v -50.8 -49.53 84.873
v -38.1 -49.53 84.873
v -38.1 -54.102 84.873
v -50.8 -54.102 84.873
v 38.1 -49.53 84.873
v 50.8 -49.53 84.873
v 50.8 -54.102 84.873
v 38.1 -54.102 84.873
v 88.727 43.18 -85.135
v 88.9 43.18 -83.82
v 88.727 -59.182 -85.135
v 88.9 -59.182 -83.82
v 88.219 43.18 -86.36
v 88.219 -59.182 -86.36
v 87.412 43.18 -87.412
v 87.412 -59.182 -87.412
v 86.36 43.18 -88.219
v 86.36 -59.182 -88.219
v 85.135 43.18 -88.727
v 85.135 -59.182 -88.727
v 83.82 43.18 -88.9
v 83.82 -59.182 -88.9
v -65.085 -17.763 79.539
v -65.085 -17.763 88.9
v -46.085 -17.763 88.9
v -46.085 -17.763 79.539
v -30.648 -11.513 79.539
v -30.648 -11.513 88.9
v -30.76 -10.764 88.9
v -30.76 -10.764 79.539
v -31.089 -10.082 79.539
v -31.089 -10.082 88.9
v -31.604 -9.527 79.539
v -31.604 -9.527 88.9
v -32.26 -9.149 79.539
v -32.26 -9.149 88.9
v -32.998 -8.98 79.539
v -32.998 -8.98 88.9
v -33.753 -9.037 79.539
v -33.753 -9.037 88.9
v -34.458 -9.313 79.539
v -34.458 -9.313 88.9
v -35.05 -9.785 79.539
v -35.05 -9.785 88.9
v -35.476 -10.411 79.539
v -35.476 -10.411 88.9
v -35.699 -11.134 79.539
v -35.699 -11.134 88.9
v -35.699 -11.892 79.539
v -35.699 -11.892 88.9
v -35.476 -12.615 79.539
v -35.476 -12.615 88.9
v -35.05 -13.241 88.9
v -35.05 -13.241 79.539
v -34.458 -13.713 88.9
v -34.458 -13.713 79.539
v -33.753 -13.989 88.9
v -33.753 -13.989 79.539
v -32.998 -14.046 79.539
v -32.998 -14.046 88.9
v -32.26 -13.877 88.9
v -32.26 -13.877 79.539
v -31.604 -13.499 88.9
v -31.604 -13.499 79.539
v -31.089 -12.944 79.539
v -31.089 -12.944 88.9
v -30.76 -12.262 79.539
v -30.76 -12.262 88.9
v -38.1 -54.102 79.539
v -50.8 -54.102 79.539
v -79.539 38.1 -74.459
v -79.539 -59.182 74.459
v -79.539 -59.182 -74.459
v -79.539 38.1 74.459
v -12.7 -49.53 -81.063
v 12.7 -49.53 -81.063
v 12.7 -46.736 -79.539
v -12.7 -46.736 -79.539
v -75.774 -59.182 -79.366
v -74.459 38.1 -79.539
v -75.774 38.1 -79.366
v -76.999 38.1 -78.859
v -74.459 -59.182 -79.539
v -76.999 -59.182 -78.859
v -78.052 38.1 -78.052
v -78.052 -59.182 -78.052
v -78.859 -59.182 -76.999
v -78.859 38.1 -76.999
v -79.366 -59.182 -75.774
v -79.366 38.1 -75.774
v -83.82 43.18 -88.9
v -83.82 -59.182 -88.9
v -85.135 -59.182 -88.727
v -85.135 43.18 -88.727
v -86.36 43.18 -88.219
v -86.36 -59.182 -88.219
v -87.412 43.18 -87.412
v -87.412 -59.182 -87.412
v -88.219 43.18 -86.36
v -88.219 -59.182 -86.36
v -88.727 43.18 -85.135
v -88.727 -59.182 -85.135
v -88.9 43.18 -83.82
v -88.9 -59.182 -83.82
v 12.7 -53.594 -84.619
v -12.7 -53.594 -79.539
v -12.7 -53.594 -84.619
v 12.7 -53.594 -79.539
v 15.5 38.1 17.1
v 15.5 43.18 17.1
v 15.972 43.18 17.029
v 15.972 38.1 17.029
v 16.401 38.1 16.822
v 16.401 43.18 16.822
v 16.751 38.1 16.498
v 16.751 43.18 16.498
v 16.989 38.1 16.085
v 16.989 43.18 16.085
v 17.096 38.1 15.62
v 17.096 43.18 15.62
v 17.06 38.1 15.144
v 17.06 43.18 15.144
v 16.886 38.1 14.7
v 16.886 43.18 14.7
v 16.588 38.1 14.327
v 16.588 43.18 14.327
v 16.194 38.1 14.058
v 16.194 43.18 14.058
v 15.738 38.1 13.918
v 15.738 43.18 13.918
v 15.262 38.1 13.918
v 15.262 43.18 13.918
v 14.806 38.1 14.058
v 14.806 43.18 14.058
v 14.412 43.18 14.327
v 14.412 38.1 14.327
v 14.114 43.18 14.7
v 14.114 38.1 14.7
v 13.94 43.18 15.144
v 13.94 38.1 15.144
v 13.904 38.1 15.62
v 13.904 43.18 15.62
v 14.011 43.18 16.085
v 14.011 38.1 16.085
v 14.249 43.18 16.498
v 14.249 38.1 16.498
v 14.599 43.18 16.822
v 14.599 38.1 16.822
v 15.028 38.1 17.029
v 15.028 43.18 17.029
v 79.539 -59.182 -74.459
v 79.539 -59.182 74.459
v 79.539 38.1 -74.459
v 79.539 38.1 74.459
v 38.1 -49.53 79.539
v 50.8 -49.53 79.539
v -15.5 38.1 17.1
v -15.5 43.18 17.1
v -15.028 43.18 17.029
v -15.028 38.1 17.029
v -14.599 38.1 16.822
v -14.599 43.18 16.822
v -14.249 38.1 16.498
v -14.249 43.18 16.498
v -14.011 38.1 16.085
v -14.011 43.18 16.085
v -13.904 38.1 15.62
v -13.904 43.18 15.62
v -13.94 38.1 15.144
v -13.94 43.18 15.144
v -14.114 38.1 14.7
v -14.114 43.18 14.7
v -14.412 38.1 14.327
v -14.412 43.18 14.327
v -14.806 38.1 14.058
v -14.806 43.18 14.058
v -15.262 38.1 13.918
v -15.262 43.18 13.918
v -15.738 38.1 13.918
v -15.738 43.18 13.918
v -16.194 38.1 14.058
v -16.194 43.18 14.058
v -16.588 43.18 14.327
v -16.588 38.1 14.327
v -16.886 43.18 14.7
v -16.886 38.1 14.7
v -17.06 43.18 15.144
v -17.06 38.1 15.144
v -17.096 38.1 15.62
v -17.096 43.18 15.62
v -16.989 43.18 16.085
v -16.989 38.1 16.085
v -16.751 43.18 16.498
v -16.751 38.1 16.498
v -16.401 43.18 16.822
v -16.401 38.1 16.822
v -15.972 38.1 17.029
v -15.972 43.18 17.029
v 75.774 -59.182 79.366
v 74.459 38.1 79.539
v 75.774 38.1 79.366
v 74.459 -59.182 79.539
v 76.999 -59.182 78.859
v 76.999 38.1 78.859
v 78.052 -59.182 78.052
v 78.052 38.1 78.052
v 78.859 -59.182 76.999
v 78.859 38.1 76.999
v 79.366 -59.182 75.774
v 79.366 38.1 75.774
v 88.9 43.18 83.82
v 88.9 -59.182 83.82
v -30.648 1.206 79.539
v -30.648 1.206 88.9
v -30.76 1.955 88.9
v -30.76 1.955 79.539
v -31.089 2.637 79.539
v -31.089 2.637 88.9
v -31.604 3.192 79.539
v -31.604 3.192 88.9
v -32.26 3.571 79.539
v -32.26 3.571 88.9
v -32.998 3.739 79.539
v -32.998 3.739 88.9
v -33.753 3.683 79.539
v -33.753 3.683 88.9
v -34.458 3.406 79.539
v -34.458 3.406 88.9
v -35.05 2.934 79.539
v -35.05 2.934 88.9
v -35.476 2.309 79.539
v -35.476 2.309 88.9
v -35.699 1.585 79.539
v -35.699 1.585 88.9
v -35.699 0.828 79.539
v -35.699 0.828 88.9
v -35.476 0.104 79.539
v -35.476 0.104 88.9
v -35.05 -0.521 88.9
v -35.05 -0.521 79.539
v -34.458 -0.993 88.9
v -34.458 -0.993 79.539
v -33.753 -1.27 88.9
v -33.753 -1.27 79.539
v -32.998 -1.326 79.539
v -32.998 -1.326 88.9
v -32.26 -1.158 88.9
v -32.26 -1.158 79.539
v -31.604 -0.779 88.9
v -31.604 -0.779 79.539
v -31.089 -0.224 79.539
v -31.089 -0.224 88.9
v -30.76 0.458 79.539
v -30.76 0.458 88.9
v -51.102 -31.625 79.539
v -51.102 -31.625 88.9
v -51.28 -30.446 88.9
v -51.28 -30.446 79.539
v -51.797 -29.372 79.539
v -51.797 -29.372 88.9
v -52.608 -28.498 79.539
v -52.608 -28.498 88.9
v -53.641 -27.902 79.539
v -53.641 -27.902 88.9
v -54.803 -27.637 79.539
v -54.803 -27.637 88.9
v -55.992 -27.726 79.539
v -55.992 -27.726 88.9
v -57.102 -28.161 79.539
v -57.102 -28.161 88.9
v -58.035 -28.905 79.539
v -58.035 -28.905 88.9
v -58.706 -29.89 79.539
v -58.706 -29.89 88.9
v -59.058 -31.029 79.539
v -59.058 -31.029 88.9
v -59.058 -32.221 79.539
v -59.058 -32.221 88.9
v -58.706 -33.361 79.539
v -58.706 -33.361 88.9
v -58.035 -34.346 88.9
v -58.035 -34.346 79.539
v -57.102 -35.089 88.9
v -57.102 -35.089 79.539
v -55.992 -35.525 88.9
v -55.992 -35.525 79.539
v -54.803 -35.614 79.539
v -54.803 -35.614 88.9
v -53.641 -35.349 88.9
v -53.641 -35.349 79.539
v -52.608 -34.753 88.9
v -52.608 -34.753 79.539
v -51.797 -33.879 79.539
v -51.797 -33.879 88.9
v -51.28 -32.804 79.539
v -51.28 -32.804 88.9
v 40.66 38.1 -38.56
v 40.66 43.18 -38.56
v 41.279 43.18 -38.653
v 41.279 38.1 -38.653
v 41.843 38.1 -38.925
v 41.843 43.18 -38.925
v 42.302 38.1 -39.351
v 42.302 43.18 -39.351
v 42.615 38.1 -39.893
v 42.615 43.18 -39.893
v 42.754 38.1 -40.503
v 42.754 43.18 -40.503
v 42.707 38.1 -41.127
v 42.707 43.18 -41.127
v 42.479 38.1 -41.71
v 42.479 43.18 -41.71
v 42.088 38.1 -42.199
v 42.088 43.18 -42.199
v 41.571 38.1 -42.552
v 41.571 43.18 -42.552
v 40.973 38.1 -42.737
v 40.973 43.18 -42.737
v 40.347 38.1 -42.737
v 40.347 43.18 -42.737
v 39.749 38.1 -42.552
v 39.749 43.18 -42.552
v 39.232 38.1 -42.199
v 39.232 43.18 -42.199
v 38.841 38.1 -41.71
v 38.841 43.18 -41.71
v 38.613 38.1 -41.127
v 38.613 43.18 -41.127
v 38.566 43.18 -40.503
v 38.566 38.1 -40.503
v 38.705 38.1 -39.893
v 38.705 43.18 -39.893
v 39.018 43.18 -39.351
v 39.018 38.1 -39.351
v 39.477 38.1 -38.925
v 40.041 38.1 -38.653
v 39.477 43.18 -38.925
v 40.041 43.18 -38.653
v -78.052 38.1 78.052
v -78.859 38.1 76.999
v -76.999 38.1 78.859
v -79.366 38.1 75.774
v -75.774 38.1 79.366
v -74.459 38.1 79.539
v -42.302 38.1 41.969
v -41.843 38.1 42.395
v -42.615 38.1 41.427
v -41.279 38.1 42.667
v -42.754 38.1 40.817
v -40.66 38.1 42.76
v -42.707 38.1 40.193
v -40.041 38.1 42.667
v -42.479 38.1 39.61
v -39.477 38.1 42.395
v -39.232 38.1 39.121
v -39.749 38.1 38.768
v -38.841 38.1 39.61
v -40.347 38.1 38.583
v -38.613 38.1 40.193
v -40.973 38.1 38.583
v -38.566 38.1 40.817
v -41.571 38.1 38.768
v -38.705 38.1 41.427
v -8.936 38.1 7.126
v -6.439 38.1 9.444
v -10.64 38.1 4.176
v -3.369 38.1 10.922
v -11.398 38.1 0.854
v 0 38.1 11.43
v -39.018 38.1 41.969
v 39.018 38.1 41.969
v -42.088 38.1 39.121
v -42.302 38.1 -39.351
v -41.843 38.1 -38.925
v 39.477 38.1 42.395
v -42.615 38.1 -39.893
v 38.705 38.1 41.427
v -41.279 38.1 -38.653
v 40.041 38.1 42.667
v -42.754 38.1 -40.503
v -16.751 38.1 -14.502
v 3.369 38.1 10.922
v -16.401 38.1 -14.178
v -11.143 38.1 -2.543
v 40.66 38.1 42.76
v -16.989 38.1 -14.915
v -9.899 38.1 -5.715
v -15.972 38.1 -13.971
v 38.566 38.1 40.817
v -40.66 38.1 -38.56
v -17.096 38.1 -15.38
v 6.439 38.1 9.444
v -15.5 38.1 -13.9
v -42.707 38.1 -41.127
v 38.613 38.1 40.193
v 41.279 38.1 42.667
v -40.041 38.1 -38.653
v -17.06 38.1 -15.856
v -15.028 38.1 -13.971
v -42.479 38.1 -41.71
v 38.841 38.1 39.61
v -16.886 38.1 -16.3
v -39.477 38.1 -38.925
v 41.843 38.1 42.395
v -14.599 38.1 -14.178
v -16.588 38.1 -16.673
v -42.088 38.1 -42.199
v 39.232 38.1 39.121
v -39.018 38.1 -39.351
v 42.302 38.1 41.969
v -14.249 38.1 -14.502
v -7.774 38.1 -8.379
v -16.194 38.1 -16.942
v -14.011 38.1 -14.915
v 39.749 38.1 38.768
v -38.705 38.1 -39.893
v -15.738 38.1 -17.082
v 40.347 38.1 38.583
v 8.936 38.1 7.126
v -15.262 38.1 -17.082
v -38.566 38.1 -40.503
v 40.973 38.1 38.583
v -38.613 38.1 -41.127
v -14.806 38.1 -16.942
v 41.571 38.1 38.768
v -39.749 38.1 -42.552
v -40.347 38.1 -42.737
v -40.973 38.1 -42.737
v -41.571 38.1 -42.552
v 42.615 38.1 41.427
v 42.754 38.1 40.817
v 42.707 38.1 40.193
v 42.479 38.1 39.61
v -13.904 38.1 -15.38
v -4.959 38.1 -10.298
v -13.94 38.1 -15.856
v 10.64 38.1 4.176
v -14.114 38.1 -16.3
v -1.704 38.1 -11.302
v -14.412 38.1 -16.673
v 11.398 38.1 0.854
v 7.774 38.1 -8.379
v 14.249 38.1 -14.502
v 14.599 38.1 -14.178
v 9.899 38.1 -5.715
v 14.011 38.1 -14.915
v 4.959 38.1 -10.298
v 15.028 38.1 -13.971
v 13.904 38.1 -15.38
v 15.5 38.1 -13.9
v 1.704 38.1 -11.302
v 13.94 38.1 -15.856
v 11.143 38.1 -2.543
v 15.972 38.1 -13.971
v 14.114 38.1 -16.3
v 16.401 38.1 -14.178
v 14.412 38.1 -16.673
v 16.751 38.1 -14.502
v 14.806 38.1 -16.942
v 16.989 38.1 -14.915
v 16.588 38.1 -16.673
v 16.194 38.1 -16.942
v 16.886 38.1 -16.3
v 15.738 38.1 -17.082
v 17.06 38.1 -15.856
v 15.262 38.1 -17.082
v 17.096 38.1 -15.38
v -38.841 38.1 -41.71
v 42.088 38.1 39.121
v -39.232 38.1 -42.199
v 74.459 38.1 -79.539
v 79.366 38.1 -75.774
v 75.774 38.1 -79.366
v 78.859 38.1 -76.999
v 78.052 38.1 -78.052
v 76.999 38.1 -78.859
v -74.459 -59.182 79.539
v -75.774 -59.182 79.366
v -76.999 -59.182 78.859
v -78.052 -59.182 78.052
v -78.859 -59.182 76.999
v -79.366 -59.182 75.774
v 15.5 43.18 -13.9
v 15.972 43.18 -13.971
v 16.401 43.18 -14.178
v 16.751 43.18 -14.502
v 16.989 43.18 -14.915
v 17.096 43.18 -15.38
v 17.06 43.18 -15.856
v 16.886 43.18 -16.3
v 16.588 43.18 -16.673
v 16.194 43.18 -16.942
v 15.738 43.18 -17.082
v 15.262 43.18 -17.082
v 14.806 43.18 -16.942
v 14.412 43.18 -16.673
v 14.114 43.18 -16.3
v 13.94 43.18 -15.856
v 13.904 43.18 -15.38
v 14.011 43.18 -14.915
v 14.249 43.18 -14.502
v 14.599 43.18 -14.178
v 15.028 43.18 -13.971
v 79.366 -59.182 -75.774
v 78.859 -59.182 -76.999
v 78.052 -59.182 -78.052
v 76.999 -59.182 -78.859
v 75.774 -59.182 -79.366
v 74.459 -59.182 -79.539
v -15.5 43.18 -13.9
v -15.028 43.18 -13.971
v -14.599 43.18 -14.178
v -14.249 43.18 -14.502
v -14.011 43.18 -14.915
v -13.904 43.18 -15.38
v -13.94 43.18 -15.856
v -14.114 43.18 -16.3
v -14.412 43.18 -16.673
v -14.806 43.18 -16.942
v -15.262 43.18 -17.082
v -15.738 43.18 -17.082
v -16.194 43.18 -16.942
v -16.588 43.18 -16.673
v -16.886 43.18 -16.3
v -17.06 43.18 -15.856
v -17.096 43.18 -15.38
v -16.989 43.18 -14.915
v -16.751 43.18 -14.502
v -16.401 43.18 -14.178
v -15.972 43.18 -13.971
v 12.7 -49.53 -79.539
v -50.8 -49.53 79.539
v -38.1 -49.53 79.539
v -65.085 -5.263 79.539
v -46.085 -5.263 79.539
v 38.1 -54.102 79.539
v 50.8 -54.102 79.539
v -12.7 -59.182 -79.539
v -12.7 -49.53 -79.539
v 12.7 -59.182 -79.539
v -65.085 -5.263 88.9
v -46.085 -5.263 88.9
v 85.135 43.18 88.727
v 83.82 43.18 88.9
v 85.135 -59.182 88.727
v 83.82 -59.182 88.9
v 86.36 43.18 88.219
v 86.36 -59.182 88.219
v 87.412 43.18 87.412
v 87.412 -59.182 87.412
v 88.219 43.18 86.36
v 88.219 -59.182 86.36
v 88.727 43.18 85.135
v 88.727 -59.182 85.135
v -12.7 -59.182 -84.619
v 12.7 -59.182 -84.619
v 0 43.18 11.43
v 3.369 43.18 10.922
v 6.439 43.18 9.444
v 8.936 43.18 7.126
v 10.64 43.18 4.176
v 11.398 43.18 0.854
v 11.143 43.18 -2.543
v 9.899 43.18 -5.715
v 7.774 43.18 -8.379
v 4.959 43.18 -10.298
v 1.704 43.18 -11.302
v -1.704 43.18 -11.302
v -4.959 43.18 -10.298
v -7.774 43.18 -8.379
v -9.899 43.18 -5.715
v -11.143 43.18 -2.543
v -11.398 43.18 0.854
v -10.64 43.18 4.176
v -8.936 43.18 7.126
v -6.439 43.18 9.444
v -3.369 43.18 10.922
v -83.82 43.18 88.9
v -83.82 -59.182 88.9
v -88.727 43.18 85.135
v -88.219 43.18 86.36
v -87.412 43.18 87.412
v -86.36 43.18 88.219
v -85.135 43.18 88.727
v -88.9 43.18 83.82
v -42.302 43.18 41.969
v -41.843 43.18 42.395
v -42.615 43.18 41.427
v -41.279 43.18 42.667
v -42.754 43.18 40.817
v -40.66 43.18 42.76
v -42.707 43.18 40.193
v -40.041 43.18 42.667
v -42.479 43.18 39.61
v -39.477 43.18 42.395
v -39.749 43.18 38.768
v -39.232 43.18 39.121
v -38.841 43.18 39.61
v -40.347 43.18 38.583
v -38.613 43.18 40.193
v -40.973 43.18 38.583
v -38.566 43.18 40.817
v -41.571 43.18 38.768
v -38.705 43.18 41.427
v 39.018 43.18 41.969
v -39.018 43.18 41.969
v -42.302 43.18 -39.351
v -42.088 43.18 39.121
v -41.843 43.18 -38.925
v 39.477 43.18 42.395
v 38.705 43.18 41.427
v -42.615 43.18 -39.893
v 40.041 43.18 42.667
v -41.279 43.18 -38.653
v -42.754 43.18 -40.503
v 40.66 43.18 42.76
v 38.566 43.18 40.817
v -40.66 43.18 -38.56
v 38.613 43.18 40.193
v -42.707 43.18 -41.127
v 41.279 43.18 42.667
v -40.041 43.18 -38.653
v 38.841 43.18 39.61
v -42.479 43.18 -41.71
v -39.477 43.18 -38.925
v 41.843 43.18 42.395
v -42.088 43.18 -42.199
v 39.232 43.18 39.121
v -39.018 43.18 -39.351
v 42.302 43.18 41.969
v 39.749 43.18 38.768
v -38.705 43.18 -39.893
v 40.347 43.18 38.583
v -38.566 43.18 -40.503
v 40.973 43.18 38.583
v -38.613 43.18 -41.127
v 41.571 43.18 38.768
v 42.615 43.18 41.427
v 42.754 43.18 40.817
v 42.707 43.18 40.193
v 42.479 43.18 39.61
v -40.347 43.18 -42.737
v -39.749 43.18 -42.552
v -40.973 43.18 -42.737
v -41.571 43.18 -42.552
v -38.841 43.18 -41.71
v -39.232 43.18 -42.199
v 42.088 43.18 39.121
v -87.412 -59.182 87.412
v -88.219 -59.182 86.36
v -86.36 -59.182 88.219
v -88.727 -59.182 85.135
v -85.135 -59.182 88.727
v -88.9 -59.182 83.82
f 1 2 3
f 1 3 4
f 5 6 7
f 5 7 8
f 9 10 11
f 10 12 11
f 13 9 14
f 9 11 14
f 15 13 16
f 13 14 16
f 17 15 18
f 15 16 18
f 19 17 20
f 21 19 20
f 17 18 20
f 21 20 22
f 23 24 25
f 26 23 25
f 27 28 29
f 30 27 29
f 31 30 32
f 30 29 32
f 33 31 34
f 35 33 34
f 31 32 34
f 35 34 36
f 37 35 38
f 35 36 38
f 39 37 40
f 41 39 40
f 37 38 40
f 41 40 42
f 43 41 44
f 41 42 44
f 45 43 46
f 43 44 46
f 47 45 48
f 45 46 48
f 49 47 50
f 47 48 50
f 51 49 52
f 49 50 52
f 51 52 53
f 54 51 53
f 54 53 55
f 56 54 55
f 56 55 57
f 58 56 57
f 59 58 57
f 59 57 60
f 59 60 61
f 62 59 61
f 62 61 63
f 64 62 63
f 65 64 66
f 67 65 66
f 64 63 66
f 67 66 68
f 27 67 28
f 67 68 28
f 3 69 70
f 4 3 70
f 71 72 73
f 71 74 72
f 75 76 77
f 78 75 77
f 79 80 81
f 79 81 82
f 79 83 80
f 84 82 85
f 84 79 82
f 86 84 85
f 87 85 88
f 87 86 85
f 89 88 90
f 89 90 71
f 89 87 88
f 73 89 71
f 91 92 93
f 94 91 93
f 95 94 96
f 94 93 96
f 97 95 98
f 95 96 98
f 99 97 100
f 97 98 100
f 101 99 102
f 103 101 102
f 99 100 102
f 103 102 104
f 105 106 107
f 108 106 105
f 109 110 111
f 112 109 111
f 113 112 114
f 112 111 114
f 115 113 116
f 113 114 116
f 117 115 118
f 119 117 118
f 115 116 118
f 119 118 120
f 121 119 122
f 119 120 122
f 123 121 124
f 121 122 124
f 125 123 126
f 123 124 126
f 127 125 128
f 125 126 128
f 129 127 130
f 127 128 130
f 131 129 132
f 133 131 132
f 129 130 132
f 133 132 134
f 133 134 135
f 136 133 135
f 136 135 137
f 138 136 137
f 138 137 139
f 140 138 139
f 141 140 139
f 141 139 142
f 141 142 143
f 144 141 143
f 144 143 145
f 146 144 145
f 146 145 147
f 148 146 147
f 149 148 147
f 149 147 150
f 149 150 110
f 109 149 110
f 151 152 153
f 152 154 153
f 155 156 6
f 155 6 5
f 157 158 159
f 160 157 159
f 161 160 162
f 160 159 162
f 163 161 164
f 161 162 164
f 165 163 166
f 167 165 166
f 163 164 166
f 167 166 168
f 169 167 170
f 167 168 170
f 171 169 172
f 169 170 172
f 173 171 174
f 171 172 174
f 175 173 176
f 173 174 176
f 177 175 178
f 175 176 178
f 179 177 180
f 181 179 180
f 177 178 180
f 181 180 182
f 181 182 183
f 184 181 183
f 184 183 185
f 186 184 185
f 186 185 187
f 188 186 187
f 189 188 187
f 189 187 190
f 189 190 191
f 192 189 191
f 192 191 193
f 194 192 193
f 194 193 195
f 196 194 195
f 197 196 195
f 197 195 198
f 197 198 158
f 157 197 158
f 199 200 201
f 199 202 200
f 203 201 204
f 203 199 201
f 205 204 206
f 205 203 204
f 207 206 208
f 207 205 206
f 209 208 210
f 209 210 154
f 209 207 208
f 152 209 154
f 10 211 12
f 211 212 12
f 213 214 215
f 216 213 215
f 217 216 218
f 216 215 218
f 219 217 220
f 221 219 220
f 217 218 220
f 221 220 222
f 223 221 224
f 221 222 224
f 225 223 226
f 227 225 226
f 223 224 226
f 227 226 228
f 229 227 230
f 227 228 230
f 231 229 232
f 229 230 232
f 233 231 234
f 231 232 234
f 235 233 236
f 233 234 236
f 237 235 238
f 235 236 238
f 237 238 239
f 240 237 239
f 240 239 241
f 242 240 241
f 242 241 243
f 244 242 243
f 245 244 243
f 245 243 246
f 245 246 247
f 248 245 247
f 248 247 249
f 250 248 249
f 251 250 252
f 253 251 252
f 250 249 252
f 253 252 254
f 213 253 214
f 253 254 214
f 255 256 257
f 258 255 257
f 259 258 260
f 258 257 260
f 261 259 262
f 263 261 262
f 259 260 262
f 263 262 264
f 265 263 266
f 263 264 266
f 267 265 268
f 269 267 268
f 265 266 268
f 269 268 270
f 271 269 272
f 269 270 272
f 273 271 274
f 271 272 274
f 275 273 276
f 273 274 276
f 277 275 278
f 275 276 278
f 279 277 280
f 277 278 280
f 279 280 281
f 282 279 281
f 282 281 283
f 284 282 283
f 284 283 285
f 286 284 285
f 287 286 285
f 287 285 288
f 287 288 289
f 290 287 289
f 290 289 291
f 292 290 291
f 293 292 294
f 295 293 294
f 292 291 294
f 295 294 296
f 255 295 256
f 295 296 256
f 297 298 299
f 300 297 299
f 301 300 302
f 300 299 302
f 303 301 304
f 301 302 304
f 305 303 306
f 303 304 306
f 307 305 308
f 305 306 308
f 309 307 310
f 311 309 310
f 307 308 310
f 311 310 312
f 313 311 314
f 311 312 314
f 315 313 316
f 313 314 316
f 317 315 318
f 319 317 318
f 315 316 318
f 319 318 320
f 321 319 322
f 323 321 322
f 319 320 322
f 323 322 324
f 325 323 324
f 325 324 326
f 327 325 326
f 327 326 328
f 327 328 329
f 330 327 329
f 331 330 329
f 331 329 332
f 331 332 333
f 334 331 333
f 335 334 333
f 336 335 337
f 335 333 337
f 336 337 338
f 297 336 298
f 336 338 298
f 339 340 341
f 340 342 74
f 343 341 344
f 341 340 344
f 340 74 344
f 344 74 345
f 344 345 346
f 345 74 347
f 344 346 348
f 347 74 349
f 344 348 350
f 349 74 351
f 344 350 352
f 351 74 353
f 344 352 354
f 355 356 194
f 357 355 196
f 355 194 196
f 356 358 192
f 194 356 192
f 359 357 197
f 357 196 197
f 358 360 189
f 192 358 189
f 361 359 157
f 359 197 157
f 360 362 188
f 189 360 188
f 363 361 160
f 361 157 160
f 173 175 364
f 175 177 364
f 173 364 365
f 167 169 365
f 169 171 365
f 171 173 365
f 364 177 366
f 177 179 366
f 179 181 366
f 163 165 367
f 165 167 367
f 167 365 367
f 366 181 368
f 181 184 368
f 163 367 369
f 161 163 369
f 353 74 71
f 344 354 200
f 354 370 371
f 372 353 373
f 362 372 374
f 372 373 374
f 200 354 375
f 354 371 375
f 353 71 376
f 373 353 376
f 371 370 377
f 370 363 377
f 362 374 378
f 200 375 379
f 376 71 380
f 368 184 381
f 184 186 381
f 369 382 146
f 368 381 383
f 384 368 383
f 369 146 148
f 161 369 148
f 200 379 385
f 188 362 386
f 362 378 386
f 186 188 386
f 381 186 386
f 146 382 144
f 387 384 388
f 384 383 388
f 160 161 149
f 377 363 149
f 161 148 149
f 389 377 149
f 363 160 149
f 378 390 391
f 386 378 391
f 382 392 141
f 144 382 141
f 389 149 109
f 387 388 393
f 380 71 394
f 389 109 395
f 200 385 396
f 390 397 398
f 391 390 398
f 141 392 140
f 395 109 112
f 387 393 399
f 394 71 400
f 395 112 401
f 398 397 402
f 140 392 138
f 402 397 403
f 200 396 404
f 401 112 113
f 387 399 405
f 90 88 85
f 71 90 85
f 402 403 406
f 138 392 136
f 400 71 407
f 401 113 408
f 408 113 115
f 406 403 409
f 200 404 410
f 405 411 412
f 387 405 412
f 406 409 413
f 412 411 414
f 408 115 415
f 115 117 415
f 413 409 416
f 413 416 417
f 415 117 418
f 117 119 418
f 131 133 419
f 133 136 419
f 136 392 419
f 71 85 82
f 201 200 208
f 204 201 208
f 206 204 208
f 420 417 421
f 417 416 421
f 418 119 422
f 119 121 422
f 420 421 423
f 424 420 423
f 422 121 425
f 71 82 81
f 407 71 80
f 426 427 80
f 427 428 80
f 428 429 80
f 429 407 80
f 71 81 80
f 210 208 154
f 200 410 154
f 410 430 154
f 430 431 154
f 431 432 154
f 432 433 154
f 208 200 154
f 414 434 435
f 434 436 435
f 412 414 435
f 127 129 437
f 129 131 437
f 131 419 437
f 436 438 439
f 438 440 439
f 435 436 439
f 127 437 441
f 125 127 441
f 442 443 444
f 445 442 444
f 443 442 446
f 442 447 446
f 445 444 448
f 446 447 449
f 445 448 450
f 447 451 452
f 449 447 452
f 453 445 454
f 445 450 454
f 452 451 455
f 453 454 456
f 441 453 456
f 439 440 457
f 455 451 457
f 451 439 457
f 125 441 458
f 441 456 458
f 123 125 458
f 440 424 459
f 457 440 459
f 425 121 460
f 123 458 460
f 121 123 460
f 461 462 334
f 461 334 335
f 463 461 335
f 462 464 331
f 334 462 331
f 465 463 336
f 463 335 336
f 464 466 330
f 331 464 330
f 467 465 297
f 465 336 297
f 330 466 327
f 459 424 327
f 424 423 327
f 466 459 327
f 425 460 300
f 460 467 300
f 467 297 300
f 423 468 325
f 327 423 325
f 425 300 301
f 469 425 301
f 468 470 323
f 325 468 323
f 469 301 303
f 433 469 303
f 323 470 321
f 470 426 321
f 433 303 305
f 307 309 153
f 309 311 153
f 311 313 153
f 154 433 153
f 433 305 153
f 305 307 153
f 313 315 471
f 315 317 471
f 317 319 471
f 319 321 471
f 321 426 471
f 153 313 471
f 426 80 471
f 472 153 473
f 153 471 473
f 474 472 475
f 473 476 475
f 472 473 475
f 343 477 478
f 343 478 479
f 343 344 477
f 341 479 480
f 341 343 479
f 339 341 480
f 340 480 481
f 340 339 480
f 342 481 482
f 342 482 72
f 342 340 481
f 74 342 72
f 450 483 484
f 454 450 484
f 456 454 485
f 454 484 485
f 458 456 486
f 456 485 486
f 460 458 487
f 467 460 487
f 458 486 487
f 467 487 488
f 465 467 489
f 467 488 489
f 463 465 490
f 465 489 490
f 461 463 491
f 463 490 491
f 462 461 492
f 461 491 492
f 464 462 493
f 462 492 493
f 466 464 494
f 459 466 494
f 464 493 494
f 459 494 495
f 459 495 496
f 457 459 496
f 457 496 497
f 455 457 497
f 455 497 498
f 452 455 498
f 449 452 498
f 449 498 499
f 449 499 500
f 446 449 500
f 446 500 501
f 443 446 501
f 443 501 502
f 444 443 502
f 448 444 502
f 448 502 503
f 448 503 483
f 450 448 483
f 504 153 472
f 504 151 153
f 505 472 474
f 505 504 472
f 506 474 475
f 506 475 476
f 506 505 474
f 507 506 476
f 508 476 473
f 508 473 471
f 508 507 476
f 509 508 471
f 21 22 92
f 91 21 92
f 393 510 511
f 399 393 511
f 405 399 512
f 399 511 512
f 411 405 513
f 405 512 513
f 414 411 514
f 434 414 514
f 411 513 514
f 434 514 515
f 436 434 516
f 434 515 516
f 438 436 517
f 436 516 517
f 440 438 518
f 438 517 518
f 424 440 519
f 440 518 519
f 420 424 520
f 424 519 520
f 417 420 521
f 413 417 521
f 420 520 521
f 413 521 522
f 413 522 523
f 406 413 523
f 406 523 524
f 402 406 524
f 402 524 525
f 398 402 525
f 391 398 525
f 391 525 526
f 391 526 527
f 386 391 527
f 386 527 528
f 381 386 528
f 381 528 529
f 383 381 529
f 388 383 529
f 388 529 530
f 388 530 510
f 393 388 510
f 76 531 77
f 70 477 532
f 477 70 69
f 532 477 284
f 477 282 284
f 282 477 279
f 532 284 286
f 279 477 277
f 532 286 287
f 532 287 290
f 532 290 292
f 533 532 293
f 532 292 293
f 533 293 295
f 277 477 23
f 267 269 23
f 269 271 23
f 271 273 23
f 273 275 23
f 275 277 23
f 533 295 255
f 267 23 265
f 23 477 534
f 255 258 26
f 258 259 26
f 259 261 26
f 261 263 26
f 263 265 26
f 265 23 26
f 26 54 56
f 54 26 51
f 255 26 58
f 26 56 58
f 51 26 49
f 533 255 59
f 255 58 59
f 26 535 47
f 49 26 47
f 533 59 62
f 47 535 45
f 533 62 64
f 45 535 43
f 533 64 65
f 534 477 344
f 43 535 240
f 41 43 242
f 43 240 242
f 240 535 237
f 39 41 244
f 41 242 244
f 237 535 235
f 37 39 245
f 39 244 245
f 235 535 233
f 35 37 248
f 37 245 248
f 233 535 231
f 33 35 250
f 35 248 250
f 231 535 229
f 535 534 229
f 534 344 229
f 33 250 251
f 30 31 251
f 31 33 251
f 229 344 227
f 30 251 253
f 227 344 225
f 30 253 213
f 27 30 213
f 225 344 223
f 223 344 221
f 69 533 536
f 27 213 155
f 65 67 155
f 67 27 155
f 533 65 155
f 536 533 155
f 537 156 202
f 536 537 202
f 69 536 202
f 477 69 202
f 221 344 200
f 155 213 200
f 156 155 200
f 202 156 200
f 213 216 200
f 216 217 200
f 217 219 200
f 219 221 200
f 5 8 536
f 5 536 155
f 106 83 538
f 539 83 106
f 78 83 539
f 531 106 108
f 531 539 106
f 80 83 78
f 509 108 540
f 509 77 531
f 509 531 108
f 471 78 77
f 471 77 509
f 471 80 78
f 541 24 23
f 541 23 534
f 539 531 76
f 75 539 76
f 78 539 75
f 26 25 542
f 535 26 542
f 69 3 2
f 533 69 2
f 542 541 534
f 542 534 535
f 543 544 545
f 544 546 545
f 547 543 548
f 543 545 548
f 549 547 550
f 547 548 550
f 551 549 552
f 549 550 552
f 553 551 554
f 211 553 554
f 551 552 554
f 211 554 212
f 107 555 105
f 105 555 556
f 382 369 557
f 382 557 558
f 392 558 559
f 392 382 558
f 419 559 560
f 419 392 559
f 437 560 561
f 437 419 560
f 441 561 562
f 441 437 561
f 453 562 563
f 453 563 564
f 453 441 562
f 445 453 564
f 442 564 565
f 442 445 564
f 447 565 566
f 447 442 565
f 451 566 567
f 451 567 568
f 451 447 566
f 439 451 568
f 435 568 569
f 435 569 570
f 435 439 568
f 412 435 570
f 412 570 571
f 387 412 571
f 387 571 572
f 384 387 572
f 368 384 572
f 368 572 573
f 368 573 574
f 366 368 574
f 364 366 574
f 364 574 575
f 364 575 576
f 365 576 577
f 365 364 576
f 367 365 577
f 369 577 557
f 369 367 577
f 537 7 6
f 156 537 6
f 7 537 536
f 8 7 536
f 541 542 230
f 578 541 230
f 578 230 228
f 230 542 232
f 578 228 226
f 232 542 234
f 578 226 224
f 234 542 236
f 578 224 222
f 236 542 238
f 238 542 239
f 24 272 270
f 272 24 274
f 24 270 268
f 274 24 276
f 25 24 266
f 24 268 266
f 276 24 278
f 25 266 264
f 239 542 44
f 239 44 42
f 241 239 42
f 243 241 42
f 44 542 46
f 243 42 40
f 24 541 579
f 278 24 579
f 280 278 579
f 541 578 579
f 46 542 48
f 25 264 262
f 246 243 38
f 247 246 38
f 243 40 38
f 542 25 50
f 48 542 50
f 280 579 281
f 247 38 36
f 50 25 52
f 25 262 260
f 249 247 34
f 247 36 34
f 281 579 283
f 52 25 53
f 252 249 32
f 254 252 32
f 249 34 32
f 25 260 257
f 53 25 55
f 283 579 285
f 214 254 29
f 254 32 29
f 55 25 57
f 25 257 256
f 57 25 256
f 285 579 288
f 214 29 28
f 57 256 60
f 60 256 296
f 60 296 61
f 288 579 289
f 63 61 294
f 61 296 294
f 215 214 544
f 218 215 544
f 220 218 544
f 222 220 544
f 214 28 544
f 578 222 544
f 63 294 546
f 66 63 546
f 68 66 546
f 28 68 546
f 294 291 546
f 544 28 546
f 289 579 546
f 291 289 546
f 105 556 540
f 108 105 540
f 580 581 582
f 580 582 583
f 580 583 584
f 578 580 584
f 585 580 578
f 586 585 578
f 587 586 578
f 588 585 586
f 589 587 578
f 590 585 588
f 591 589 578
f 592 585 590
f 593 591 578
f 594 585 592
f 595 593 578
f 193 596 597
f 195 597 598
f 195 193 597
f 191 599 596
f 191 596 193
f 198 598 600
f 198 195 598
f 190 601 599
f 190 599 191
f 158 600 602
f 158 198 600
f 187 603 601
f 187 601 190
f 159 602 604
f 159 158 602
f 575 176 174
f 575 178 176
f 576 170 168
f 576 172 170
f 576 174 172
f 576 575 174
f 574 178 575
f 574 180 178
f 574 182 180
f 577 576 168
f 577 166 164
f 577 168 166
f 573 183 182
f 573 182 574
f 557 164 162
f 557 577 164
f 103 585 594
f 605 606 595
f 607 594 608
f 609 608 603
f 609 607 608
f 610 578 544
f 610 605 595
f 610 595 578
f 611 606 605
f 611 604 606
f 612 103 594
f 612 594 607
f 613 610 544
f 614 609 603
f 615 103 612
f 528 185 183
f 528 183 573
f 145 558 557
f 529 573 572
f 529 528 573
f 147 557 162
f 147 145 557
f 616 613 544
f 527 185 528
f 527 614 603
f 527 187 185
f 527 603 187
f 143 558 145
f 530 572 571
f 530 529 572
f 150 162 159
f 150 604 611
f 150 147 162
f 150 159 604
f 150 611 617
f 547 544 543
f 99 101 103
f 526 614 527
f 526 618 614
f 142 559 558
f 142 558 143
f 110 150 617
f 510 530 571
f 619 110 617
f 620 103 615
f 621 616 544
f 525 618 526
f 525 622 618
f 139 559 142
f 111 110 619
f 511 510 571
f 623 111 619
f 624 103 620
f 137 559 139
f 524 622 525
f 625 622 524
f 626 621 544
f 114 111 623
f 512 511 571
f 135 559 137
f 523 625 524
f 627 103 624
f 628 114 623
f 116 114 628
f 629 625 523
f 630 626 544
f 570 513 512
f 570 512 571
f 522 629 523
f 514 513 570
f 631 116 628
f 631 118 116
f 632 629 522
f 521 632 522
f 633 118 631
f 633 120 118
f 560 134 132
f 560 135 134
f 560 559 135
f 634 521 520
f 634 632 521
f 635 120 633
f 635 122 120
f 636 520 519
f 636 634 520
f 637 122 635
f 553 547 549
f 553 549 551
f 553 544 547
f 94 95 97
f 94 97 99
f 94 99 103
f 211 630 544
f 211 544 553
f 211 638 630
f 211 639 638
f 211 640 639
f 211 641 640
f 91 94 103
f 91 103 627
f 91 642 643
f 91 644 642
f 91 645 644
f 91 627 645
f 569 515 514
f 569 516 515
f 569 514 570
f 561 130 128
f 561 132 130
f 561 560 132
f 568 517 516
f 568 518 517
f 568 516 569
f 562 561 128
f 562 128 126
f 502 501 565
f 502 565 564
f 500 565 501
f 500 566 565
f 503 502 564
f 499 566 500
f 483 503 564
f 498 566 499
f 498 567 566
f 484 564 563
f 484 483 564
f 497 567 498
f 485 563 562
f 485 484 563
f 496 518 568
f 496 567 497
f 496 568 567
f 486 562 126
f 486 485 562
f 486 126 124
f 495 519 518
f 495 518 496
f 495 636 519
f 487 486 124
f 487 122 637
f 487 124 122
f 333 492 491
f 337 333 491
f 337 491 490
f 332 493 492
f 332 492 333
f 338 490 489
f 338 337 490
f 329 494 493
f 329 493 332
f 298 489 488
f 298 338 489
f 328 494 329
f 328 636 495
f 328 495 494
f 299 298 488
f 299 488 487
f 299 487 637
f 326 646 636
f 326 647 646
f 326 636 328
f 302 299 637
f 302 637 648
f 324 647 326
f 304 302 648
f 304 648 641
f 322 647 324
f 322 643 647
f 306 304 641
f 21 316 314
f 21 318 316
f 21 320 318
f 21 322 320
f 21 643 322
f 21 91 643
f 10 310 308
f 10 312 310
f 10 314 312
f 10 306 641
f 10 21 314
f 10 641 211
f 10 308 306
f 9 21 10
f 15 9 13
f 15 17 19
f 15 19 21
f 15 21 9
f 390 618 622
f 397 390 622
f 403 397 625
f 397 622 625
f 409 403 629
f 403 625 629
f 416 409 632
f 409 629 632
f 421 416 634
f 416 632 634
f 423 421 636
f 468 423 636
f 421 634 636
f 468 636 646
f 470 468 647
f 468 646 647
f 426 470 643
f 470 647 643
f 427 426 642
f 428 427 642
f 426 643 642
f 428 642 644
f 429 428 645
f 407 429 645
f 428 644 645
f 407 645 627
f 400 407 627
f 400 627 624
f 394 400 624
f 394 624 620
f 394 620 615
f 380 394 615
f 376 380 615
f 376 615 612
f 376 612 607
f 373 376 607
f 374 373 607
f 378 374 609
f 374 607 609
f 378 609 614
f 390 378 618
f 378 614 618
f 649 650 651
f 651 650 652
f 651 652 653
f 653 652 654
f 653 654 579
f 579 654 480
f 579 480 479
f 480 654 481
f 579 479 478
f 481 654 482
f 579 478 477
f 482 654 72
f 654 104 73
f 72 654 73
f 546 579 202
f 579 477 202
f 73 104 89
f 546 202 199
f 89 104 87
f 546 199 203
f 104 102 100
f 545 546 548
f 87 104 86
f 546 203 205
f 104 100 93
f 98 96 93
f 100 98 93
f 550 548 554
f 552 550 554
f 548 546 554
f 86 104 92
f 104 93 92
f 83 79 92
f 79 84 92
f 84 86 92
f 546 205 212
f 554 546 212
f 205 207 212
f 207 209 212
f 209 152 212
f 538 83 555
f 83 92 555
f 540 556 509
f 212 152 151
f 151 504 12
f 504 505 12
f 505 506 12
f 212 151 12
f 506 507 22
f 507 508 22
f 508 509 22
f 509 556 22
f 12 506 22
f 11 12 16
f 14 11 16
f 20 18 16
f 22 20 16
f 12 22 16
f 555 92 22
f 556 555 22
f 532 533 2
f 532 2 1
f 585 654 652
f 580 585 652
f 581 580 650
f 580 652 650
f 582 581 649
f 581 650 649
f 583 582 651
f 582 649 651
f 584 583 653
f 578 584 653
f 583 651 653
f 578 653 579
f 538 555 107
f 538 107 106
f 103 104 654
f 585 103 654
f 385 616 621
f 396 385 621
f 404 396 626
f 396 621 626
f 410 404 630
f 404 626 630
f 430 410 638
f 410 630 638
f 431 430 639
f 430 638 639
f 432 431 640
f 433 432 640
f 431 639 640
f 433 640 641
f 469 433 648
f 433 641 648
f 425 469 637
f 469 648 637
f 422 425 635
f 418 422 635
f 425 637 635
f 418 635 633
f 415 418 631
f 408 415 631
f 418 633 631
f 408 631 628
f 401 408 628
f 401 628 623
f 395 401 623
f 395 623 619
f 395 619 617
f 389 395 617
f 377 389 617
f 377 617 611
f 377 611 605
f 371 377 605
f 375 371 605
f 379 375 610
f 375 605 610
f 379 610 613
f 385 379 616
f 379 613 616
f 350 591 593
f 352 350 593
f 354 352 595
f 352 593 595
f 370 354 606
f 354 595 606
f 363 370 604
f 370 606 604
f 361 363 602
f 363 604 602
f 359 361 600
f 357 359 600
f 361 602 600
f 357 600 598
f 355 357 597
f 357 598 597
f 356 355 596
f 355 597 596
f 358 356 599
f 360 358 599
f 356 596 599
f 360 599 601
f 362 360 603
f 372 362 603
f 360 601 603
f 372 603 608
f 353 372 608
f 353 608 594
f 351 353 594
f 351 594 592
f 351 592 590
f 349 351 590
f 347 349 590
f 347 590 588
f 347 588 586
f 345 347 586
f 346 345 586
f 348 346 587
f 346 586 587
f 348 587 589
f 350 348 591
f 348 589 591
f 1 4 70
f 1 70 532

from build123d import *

# Parameters (mm, degrees)
SKETCH1_W                = 159.078855478
SKETCH1_H                = 159.078855478
BOSS_EXTRUDE1_DEPTH      = 38.1
BOSS_EXTRUDE1_DEPTH_BACK = 59.182
BOSS_EXTRUDE3_START      = 38.1
SKETCH1_5_R              = 11.43
BOSS_EXTRUDE3_DEPTH      = 5.08
SKETCH3_R                = 1.6
CUT_EXTRUDE1_DEPTH       = 163.124640459
FILLET4_R                = 5.08
SKETCH4_R                = 2.1
CUT_EXTRUDE2_DEPTH       = 5.08
SKETCH5_R                = 2.54
SKETCH5_R_2              = 4
SKETCH5_W                = 19
SKETCH5_H                = 12.5
CUT_EXTRUDE3_DEPTH       = 9.360572261
SKETCH7_W                = 25.4
SKETCH7_H                = 5.08
CUT_EXTRUDE4_DEPTH       = 5.588
BOSS_EXTRUDE4_DEPTH      = 25.4
CUT_EXTRUDE5_DEPTH       = 25.4
SKETCH11_W               = 12.7
SKETCH11_H               = 4.572
CUT_EXTRUDE6_DEPTH       = 5.334


with BuildPart() as part:
    # Sketch1 → Boss-Extrude1 (new, two sides)
    with BuildSketch(Plane(origin=(0, 0, 0), x_dir=(1, 0, 0), z_dir=(0, 1, 0))) as boss_extrude1_sk:
        with BuildLine():
            Line((-83.82, -88.9), (83.82, -88.9))
            ThreePointArc((83.82, -88.9), (87.412102448, -87.412102448), (88.9, -83.82))
            Line((88.9, -83.82), (88.9, 83.82))
            ThreePointArc((88.9, 83.82), (87.412102448, 87.412102448), (83.82, 88.9))
            Line((83.82, 88.9), (-83.82, 88.9))
            ThreePointArc((-83.82, 88.9), (-87.412102448, 87.412102448), (-88.9, 83.82))
            Line((-88.9, 83.82), (-88.9, -83.82))
            ThreePointArc((-88.9, -83.82), (-87.412102448, -87.412102448), (-83.82, -88.9))
        make_face()
        Rectangle(SKETCH1_W, SKETCH1_H, mode=Mode.SUBTRACT)
    extrude(amount=BOSS_EXTRUDE1_DEPTH)
    extrude(boss_extrude1_sk.sketch, amount=-BOSS_EXTRUDE1_DEPTH_BACK)

    # Sketch1<5> → Boss-Extrude3 (add)
    with BuildSketch(Plane(origin=(0, 0, 0), x_dir=(1, 0, 0), z_dir=(0, 1, 0)).offset(BOSS_EXTRUDE3_START)):
        with BuildLine():
            ThreePointArc((-88.9, -83.82), (-87.412102448, -87.412102448), (-83.82, -88.9))
            Line((-83.82, -88.9), (83.82, -88.9))
            ThreePointArc((83.82, -88.9), (87.412102448, -87.412102448), (88.9, -83.82))
            Line((88.9, -83.82), (88.9, 83.82))
            ThreePointArc((88.9, 83.82), (87.412102448, 87.412102448), (83.82, 88.9))
            Line((83.82, 88.9), (-83.82, 88.9))
            ThreePointArc((-83.82, 88.9), (-87.412102448, 87.412102448), (-88.9, 83.82))
            Line((-88.9, 83.82), (-88.9, -83.82))
        make_face()
        with Locations(Location((0, 0, 0), (0, 0, 270))):
            Circle(SKETCH1_5_R, mode=Mode.SUBTRACT)
    extrude(amount=BOSS_EXTRUDE3_DEPTH)

    # Sketch3 → Cut-Extrude1 (cut, through all)
    with BuildSketch(Plane(origin=(0, 43.18, 0), x_dir=(1, 0, 0), z_dir=(0, 1, 0))):
        with Locations(Location((-15.5, 15.5, 0), (0, 0, 270))):
            Circle(SKETCH3_R)
        with Locations(Location((-15.5, -15.5, 0), (0, 0, 270))):
            Circle(SKETCH3_R)
        with Locations(Location((15.5, 15.5, 0), (0, 0, 270))):
            Circle(SKETCH3_R)
        with Locations(Location((15.5, -15.5, 0), (0, 0, 270))):
            Circle(SKETCH3_R)
    extrude(amount=-CUT_EXTRUDE1_DEPTH, mode=Mode.SUBTRACT)

    # Fillet4
    fillet4_edges = [part.edges().sort_by_distance(p)[0] for p in [
        (79.539427739, -10.541, -79.539427739),
        (-79.539427739, -10.541, -79.539427739),
        (-79.539427739, -10.541, 79.539427739),
        (79.539427739, -10.541, 79.539427739),
    ]]
    fillet(fillet4_edges, radius=FILLET4_R)

    # Sketch4 → Cut-Extrude2 (cut)
    with BuildSketch(Plane(origin=(0, 43.18, 0), x_dir=(1, 0, 0), z_dir=(0, 1, 0))):
        with Locations(Location((-40.66, 40.66, 0), (0, 0, 270))):
            Circle(SKETCH4_R)
        with Locations(Location((40.66, 40.66, 0), (0, 0, 270))):
            Circle(SKETCH4_R)
        with Locations(Location((-40.66, -40.66, 0), (0, 0, 270))):
            Circle(SKETCH4_R)
        with Locations(Location((40.66, -40.66, 0), (0, 0, 270))):
            Circle(SKETCH4_R)
    extrude(amount=-CUT_EXTRUDE2_DEPTH, mode=Mode.SUBTRACT)

    # Sketch5 → Cut-Extrude3 (cut)
    with BuildSketch(Plane.XY.offset(88.9)):
        with Locations((-33.187618463, -11.513006866)):
            Circle(SKETCH5_R)
        with Locations((-33.187618463, 1.206455413)):
            Circle(SKETCH5_R)
        with Locations((-55.102312512, -31.62532479)):
            Circle(SKETCH5_R_2)
        with Locations((-55.584910431, -11.513006866)):
            Rectangle(SKETCH5_W, SKETCH5_H)
    extrude(amount=-CUT_EXTRUDE3_DEPTH, mode=Mode.SUBTRACT)

    # Sketch7 → Cut-Extrude4 (cut)
    with BuildSketch(Plane.XZ.offset(59.182)):
        with Locations((0, -82.079427739)):
            Rectangle(SKETCH7_W, SKETCH7_H)
    extrude(amount=-CUT_EXTRUDE4_DEPTH, mode=Mode.SUBTRACT)

    # Sketch10 → Boss-Extrude4 (add)
    with BuildSketch(Plane.ZY.offset(-12.7)):
        Polygon((-79.539427739, -46.736), (-79.539427739, -49.53), (-81.063427739, -49.53), align=None)
    extrude(amount=BOSS_EXTRUDE4_DEPTH)

    # Sketch10<2> → Cut-Extrude5 (cut)
    with BuildSketch(Plane.ZY.offset(-12.7)):
        Polygon((-79.539427739, -46.736), (-79.539427739, -49.53), (-81.063427739, -49.53), align=None)
    extrude(amount=CUT_EXTRUDE5_DEPTH, mode=Mode.SUBTRACT)

    # Sketch11 → Cut-Extrude6 (cut)
    with BuildSketch(Plane(origin=(0, 0, 79.539427739), x_dir=(-1, 0, 0), z_dir=(0, 0, -1))):
        with Locations((-44.45, -51.816)):
            Rectangle(SKETCH11_W, SKETCH11_H)
        with Locations((44.45, -51.816)):
            Rectangle(SKETCH11_W, SKETCH11_H)
    extrude(amount=-CUT_EXTRUDE6_DEPTH, mode=Mode.SUBTRACT)


solid = part.part
